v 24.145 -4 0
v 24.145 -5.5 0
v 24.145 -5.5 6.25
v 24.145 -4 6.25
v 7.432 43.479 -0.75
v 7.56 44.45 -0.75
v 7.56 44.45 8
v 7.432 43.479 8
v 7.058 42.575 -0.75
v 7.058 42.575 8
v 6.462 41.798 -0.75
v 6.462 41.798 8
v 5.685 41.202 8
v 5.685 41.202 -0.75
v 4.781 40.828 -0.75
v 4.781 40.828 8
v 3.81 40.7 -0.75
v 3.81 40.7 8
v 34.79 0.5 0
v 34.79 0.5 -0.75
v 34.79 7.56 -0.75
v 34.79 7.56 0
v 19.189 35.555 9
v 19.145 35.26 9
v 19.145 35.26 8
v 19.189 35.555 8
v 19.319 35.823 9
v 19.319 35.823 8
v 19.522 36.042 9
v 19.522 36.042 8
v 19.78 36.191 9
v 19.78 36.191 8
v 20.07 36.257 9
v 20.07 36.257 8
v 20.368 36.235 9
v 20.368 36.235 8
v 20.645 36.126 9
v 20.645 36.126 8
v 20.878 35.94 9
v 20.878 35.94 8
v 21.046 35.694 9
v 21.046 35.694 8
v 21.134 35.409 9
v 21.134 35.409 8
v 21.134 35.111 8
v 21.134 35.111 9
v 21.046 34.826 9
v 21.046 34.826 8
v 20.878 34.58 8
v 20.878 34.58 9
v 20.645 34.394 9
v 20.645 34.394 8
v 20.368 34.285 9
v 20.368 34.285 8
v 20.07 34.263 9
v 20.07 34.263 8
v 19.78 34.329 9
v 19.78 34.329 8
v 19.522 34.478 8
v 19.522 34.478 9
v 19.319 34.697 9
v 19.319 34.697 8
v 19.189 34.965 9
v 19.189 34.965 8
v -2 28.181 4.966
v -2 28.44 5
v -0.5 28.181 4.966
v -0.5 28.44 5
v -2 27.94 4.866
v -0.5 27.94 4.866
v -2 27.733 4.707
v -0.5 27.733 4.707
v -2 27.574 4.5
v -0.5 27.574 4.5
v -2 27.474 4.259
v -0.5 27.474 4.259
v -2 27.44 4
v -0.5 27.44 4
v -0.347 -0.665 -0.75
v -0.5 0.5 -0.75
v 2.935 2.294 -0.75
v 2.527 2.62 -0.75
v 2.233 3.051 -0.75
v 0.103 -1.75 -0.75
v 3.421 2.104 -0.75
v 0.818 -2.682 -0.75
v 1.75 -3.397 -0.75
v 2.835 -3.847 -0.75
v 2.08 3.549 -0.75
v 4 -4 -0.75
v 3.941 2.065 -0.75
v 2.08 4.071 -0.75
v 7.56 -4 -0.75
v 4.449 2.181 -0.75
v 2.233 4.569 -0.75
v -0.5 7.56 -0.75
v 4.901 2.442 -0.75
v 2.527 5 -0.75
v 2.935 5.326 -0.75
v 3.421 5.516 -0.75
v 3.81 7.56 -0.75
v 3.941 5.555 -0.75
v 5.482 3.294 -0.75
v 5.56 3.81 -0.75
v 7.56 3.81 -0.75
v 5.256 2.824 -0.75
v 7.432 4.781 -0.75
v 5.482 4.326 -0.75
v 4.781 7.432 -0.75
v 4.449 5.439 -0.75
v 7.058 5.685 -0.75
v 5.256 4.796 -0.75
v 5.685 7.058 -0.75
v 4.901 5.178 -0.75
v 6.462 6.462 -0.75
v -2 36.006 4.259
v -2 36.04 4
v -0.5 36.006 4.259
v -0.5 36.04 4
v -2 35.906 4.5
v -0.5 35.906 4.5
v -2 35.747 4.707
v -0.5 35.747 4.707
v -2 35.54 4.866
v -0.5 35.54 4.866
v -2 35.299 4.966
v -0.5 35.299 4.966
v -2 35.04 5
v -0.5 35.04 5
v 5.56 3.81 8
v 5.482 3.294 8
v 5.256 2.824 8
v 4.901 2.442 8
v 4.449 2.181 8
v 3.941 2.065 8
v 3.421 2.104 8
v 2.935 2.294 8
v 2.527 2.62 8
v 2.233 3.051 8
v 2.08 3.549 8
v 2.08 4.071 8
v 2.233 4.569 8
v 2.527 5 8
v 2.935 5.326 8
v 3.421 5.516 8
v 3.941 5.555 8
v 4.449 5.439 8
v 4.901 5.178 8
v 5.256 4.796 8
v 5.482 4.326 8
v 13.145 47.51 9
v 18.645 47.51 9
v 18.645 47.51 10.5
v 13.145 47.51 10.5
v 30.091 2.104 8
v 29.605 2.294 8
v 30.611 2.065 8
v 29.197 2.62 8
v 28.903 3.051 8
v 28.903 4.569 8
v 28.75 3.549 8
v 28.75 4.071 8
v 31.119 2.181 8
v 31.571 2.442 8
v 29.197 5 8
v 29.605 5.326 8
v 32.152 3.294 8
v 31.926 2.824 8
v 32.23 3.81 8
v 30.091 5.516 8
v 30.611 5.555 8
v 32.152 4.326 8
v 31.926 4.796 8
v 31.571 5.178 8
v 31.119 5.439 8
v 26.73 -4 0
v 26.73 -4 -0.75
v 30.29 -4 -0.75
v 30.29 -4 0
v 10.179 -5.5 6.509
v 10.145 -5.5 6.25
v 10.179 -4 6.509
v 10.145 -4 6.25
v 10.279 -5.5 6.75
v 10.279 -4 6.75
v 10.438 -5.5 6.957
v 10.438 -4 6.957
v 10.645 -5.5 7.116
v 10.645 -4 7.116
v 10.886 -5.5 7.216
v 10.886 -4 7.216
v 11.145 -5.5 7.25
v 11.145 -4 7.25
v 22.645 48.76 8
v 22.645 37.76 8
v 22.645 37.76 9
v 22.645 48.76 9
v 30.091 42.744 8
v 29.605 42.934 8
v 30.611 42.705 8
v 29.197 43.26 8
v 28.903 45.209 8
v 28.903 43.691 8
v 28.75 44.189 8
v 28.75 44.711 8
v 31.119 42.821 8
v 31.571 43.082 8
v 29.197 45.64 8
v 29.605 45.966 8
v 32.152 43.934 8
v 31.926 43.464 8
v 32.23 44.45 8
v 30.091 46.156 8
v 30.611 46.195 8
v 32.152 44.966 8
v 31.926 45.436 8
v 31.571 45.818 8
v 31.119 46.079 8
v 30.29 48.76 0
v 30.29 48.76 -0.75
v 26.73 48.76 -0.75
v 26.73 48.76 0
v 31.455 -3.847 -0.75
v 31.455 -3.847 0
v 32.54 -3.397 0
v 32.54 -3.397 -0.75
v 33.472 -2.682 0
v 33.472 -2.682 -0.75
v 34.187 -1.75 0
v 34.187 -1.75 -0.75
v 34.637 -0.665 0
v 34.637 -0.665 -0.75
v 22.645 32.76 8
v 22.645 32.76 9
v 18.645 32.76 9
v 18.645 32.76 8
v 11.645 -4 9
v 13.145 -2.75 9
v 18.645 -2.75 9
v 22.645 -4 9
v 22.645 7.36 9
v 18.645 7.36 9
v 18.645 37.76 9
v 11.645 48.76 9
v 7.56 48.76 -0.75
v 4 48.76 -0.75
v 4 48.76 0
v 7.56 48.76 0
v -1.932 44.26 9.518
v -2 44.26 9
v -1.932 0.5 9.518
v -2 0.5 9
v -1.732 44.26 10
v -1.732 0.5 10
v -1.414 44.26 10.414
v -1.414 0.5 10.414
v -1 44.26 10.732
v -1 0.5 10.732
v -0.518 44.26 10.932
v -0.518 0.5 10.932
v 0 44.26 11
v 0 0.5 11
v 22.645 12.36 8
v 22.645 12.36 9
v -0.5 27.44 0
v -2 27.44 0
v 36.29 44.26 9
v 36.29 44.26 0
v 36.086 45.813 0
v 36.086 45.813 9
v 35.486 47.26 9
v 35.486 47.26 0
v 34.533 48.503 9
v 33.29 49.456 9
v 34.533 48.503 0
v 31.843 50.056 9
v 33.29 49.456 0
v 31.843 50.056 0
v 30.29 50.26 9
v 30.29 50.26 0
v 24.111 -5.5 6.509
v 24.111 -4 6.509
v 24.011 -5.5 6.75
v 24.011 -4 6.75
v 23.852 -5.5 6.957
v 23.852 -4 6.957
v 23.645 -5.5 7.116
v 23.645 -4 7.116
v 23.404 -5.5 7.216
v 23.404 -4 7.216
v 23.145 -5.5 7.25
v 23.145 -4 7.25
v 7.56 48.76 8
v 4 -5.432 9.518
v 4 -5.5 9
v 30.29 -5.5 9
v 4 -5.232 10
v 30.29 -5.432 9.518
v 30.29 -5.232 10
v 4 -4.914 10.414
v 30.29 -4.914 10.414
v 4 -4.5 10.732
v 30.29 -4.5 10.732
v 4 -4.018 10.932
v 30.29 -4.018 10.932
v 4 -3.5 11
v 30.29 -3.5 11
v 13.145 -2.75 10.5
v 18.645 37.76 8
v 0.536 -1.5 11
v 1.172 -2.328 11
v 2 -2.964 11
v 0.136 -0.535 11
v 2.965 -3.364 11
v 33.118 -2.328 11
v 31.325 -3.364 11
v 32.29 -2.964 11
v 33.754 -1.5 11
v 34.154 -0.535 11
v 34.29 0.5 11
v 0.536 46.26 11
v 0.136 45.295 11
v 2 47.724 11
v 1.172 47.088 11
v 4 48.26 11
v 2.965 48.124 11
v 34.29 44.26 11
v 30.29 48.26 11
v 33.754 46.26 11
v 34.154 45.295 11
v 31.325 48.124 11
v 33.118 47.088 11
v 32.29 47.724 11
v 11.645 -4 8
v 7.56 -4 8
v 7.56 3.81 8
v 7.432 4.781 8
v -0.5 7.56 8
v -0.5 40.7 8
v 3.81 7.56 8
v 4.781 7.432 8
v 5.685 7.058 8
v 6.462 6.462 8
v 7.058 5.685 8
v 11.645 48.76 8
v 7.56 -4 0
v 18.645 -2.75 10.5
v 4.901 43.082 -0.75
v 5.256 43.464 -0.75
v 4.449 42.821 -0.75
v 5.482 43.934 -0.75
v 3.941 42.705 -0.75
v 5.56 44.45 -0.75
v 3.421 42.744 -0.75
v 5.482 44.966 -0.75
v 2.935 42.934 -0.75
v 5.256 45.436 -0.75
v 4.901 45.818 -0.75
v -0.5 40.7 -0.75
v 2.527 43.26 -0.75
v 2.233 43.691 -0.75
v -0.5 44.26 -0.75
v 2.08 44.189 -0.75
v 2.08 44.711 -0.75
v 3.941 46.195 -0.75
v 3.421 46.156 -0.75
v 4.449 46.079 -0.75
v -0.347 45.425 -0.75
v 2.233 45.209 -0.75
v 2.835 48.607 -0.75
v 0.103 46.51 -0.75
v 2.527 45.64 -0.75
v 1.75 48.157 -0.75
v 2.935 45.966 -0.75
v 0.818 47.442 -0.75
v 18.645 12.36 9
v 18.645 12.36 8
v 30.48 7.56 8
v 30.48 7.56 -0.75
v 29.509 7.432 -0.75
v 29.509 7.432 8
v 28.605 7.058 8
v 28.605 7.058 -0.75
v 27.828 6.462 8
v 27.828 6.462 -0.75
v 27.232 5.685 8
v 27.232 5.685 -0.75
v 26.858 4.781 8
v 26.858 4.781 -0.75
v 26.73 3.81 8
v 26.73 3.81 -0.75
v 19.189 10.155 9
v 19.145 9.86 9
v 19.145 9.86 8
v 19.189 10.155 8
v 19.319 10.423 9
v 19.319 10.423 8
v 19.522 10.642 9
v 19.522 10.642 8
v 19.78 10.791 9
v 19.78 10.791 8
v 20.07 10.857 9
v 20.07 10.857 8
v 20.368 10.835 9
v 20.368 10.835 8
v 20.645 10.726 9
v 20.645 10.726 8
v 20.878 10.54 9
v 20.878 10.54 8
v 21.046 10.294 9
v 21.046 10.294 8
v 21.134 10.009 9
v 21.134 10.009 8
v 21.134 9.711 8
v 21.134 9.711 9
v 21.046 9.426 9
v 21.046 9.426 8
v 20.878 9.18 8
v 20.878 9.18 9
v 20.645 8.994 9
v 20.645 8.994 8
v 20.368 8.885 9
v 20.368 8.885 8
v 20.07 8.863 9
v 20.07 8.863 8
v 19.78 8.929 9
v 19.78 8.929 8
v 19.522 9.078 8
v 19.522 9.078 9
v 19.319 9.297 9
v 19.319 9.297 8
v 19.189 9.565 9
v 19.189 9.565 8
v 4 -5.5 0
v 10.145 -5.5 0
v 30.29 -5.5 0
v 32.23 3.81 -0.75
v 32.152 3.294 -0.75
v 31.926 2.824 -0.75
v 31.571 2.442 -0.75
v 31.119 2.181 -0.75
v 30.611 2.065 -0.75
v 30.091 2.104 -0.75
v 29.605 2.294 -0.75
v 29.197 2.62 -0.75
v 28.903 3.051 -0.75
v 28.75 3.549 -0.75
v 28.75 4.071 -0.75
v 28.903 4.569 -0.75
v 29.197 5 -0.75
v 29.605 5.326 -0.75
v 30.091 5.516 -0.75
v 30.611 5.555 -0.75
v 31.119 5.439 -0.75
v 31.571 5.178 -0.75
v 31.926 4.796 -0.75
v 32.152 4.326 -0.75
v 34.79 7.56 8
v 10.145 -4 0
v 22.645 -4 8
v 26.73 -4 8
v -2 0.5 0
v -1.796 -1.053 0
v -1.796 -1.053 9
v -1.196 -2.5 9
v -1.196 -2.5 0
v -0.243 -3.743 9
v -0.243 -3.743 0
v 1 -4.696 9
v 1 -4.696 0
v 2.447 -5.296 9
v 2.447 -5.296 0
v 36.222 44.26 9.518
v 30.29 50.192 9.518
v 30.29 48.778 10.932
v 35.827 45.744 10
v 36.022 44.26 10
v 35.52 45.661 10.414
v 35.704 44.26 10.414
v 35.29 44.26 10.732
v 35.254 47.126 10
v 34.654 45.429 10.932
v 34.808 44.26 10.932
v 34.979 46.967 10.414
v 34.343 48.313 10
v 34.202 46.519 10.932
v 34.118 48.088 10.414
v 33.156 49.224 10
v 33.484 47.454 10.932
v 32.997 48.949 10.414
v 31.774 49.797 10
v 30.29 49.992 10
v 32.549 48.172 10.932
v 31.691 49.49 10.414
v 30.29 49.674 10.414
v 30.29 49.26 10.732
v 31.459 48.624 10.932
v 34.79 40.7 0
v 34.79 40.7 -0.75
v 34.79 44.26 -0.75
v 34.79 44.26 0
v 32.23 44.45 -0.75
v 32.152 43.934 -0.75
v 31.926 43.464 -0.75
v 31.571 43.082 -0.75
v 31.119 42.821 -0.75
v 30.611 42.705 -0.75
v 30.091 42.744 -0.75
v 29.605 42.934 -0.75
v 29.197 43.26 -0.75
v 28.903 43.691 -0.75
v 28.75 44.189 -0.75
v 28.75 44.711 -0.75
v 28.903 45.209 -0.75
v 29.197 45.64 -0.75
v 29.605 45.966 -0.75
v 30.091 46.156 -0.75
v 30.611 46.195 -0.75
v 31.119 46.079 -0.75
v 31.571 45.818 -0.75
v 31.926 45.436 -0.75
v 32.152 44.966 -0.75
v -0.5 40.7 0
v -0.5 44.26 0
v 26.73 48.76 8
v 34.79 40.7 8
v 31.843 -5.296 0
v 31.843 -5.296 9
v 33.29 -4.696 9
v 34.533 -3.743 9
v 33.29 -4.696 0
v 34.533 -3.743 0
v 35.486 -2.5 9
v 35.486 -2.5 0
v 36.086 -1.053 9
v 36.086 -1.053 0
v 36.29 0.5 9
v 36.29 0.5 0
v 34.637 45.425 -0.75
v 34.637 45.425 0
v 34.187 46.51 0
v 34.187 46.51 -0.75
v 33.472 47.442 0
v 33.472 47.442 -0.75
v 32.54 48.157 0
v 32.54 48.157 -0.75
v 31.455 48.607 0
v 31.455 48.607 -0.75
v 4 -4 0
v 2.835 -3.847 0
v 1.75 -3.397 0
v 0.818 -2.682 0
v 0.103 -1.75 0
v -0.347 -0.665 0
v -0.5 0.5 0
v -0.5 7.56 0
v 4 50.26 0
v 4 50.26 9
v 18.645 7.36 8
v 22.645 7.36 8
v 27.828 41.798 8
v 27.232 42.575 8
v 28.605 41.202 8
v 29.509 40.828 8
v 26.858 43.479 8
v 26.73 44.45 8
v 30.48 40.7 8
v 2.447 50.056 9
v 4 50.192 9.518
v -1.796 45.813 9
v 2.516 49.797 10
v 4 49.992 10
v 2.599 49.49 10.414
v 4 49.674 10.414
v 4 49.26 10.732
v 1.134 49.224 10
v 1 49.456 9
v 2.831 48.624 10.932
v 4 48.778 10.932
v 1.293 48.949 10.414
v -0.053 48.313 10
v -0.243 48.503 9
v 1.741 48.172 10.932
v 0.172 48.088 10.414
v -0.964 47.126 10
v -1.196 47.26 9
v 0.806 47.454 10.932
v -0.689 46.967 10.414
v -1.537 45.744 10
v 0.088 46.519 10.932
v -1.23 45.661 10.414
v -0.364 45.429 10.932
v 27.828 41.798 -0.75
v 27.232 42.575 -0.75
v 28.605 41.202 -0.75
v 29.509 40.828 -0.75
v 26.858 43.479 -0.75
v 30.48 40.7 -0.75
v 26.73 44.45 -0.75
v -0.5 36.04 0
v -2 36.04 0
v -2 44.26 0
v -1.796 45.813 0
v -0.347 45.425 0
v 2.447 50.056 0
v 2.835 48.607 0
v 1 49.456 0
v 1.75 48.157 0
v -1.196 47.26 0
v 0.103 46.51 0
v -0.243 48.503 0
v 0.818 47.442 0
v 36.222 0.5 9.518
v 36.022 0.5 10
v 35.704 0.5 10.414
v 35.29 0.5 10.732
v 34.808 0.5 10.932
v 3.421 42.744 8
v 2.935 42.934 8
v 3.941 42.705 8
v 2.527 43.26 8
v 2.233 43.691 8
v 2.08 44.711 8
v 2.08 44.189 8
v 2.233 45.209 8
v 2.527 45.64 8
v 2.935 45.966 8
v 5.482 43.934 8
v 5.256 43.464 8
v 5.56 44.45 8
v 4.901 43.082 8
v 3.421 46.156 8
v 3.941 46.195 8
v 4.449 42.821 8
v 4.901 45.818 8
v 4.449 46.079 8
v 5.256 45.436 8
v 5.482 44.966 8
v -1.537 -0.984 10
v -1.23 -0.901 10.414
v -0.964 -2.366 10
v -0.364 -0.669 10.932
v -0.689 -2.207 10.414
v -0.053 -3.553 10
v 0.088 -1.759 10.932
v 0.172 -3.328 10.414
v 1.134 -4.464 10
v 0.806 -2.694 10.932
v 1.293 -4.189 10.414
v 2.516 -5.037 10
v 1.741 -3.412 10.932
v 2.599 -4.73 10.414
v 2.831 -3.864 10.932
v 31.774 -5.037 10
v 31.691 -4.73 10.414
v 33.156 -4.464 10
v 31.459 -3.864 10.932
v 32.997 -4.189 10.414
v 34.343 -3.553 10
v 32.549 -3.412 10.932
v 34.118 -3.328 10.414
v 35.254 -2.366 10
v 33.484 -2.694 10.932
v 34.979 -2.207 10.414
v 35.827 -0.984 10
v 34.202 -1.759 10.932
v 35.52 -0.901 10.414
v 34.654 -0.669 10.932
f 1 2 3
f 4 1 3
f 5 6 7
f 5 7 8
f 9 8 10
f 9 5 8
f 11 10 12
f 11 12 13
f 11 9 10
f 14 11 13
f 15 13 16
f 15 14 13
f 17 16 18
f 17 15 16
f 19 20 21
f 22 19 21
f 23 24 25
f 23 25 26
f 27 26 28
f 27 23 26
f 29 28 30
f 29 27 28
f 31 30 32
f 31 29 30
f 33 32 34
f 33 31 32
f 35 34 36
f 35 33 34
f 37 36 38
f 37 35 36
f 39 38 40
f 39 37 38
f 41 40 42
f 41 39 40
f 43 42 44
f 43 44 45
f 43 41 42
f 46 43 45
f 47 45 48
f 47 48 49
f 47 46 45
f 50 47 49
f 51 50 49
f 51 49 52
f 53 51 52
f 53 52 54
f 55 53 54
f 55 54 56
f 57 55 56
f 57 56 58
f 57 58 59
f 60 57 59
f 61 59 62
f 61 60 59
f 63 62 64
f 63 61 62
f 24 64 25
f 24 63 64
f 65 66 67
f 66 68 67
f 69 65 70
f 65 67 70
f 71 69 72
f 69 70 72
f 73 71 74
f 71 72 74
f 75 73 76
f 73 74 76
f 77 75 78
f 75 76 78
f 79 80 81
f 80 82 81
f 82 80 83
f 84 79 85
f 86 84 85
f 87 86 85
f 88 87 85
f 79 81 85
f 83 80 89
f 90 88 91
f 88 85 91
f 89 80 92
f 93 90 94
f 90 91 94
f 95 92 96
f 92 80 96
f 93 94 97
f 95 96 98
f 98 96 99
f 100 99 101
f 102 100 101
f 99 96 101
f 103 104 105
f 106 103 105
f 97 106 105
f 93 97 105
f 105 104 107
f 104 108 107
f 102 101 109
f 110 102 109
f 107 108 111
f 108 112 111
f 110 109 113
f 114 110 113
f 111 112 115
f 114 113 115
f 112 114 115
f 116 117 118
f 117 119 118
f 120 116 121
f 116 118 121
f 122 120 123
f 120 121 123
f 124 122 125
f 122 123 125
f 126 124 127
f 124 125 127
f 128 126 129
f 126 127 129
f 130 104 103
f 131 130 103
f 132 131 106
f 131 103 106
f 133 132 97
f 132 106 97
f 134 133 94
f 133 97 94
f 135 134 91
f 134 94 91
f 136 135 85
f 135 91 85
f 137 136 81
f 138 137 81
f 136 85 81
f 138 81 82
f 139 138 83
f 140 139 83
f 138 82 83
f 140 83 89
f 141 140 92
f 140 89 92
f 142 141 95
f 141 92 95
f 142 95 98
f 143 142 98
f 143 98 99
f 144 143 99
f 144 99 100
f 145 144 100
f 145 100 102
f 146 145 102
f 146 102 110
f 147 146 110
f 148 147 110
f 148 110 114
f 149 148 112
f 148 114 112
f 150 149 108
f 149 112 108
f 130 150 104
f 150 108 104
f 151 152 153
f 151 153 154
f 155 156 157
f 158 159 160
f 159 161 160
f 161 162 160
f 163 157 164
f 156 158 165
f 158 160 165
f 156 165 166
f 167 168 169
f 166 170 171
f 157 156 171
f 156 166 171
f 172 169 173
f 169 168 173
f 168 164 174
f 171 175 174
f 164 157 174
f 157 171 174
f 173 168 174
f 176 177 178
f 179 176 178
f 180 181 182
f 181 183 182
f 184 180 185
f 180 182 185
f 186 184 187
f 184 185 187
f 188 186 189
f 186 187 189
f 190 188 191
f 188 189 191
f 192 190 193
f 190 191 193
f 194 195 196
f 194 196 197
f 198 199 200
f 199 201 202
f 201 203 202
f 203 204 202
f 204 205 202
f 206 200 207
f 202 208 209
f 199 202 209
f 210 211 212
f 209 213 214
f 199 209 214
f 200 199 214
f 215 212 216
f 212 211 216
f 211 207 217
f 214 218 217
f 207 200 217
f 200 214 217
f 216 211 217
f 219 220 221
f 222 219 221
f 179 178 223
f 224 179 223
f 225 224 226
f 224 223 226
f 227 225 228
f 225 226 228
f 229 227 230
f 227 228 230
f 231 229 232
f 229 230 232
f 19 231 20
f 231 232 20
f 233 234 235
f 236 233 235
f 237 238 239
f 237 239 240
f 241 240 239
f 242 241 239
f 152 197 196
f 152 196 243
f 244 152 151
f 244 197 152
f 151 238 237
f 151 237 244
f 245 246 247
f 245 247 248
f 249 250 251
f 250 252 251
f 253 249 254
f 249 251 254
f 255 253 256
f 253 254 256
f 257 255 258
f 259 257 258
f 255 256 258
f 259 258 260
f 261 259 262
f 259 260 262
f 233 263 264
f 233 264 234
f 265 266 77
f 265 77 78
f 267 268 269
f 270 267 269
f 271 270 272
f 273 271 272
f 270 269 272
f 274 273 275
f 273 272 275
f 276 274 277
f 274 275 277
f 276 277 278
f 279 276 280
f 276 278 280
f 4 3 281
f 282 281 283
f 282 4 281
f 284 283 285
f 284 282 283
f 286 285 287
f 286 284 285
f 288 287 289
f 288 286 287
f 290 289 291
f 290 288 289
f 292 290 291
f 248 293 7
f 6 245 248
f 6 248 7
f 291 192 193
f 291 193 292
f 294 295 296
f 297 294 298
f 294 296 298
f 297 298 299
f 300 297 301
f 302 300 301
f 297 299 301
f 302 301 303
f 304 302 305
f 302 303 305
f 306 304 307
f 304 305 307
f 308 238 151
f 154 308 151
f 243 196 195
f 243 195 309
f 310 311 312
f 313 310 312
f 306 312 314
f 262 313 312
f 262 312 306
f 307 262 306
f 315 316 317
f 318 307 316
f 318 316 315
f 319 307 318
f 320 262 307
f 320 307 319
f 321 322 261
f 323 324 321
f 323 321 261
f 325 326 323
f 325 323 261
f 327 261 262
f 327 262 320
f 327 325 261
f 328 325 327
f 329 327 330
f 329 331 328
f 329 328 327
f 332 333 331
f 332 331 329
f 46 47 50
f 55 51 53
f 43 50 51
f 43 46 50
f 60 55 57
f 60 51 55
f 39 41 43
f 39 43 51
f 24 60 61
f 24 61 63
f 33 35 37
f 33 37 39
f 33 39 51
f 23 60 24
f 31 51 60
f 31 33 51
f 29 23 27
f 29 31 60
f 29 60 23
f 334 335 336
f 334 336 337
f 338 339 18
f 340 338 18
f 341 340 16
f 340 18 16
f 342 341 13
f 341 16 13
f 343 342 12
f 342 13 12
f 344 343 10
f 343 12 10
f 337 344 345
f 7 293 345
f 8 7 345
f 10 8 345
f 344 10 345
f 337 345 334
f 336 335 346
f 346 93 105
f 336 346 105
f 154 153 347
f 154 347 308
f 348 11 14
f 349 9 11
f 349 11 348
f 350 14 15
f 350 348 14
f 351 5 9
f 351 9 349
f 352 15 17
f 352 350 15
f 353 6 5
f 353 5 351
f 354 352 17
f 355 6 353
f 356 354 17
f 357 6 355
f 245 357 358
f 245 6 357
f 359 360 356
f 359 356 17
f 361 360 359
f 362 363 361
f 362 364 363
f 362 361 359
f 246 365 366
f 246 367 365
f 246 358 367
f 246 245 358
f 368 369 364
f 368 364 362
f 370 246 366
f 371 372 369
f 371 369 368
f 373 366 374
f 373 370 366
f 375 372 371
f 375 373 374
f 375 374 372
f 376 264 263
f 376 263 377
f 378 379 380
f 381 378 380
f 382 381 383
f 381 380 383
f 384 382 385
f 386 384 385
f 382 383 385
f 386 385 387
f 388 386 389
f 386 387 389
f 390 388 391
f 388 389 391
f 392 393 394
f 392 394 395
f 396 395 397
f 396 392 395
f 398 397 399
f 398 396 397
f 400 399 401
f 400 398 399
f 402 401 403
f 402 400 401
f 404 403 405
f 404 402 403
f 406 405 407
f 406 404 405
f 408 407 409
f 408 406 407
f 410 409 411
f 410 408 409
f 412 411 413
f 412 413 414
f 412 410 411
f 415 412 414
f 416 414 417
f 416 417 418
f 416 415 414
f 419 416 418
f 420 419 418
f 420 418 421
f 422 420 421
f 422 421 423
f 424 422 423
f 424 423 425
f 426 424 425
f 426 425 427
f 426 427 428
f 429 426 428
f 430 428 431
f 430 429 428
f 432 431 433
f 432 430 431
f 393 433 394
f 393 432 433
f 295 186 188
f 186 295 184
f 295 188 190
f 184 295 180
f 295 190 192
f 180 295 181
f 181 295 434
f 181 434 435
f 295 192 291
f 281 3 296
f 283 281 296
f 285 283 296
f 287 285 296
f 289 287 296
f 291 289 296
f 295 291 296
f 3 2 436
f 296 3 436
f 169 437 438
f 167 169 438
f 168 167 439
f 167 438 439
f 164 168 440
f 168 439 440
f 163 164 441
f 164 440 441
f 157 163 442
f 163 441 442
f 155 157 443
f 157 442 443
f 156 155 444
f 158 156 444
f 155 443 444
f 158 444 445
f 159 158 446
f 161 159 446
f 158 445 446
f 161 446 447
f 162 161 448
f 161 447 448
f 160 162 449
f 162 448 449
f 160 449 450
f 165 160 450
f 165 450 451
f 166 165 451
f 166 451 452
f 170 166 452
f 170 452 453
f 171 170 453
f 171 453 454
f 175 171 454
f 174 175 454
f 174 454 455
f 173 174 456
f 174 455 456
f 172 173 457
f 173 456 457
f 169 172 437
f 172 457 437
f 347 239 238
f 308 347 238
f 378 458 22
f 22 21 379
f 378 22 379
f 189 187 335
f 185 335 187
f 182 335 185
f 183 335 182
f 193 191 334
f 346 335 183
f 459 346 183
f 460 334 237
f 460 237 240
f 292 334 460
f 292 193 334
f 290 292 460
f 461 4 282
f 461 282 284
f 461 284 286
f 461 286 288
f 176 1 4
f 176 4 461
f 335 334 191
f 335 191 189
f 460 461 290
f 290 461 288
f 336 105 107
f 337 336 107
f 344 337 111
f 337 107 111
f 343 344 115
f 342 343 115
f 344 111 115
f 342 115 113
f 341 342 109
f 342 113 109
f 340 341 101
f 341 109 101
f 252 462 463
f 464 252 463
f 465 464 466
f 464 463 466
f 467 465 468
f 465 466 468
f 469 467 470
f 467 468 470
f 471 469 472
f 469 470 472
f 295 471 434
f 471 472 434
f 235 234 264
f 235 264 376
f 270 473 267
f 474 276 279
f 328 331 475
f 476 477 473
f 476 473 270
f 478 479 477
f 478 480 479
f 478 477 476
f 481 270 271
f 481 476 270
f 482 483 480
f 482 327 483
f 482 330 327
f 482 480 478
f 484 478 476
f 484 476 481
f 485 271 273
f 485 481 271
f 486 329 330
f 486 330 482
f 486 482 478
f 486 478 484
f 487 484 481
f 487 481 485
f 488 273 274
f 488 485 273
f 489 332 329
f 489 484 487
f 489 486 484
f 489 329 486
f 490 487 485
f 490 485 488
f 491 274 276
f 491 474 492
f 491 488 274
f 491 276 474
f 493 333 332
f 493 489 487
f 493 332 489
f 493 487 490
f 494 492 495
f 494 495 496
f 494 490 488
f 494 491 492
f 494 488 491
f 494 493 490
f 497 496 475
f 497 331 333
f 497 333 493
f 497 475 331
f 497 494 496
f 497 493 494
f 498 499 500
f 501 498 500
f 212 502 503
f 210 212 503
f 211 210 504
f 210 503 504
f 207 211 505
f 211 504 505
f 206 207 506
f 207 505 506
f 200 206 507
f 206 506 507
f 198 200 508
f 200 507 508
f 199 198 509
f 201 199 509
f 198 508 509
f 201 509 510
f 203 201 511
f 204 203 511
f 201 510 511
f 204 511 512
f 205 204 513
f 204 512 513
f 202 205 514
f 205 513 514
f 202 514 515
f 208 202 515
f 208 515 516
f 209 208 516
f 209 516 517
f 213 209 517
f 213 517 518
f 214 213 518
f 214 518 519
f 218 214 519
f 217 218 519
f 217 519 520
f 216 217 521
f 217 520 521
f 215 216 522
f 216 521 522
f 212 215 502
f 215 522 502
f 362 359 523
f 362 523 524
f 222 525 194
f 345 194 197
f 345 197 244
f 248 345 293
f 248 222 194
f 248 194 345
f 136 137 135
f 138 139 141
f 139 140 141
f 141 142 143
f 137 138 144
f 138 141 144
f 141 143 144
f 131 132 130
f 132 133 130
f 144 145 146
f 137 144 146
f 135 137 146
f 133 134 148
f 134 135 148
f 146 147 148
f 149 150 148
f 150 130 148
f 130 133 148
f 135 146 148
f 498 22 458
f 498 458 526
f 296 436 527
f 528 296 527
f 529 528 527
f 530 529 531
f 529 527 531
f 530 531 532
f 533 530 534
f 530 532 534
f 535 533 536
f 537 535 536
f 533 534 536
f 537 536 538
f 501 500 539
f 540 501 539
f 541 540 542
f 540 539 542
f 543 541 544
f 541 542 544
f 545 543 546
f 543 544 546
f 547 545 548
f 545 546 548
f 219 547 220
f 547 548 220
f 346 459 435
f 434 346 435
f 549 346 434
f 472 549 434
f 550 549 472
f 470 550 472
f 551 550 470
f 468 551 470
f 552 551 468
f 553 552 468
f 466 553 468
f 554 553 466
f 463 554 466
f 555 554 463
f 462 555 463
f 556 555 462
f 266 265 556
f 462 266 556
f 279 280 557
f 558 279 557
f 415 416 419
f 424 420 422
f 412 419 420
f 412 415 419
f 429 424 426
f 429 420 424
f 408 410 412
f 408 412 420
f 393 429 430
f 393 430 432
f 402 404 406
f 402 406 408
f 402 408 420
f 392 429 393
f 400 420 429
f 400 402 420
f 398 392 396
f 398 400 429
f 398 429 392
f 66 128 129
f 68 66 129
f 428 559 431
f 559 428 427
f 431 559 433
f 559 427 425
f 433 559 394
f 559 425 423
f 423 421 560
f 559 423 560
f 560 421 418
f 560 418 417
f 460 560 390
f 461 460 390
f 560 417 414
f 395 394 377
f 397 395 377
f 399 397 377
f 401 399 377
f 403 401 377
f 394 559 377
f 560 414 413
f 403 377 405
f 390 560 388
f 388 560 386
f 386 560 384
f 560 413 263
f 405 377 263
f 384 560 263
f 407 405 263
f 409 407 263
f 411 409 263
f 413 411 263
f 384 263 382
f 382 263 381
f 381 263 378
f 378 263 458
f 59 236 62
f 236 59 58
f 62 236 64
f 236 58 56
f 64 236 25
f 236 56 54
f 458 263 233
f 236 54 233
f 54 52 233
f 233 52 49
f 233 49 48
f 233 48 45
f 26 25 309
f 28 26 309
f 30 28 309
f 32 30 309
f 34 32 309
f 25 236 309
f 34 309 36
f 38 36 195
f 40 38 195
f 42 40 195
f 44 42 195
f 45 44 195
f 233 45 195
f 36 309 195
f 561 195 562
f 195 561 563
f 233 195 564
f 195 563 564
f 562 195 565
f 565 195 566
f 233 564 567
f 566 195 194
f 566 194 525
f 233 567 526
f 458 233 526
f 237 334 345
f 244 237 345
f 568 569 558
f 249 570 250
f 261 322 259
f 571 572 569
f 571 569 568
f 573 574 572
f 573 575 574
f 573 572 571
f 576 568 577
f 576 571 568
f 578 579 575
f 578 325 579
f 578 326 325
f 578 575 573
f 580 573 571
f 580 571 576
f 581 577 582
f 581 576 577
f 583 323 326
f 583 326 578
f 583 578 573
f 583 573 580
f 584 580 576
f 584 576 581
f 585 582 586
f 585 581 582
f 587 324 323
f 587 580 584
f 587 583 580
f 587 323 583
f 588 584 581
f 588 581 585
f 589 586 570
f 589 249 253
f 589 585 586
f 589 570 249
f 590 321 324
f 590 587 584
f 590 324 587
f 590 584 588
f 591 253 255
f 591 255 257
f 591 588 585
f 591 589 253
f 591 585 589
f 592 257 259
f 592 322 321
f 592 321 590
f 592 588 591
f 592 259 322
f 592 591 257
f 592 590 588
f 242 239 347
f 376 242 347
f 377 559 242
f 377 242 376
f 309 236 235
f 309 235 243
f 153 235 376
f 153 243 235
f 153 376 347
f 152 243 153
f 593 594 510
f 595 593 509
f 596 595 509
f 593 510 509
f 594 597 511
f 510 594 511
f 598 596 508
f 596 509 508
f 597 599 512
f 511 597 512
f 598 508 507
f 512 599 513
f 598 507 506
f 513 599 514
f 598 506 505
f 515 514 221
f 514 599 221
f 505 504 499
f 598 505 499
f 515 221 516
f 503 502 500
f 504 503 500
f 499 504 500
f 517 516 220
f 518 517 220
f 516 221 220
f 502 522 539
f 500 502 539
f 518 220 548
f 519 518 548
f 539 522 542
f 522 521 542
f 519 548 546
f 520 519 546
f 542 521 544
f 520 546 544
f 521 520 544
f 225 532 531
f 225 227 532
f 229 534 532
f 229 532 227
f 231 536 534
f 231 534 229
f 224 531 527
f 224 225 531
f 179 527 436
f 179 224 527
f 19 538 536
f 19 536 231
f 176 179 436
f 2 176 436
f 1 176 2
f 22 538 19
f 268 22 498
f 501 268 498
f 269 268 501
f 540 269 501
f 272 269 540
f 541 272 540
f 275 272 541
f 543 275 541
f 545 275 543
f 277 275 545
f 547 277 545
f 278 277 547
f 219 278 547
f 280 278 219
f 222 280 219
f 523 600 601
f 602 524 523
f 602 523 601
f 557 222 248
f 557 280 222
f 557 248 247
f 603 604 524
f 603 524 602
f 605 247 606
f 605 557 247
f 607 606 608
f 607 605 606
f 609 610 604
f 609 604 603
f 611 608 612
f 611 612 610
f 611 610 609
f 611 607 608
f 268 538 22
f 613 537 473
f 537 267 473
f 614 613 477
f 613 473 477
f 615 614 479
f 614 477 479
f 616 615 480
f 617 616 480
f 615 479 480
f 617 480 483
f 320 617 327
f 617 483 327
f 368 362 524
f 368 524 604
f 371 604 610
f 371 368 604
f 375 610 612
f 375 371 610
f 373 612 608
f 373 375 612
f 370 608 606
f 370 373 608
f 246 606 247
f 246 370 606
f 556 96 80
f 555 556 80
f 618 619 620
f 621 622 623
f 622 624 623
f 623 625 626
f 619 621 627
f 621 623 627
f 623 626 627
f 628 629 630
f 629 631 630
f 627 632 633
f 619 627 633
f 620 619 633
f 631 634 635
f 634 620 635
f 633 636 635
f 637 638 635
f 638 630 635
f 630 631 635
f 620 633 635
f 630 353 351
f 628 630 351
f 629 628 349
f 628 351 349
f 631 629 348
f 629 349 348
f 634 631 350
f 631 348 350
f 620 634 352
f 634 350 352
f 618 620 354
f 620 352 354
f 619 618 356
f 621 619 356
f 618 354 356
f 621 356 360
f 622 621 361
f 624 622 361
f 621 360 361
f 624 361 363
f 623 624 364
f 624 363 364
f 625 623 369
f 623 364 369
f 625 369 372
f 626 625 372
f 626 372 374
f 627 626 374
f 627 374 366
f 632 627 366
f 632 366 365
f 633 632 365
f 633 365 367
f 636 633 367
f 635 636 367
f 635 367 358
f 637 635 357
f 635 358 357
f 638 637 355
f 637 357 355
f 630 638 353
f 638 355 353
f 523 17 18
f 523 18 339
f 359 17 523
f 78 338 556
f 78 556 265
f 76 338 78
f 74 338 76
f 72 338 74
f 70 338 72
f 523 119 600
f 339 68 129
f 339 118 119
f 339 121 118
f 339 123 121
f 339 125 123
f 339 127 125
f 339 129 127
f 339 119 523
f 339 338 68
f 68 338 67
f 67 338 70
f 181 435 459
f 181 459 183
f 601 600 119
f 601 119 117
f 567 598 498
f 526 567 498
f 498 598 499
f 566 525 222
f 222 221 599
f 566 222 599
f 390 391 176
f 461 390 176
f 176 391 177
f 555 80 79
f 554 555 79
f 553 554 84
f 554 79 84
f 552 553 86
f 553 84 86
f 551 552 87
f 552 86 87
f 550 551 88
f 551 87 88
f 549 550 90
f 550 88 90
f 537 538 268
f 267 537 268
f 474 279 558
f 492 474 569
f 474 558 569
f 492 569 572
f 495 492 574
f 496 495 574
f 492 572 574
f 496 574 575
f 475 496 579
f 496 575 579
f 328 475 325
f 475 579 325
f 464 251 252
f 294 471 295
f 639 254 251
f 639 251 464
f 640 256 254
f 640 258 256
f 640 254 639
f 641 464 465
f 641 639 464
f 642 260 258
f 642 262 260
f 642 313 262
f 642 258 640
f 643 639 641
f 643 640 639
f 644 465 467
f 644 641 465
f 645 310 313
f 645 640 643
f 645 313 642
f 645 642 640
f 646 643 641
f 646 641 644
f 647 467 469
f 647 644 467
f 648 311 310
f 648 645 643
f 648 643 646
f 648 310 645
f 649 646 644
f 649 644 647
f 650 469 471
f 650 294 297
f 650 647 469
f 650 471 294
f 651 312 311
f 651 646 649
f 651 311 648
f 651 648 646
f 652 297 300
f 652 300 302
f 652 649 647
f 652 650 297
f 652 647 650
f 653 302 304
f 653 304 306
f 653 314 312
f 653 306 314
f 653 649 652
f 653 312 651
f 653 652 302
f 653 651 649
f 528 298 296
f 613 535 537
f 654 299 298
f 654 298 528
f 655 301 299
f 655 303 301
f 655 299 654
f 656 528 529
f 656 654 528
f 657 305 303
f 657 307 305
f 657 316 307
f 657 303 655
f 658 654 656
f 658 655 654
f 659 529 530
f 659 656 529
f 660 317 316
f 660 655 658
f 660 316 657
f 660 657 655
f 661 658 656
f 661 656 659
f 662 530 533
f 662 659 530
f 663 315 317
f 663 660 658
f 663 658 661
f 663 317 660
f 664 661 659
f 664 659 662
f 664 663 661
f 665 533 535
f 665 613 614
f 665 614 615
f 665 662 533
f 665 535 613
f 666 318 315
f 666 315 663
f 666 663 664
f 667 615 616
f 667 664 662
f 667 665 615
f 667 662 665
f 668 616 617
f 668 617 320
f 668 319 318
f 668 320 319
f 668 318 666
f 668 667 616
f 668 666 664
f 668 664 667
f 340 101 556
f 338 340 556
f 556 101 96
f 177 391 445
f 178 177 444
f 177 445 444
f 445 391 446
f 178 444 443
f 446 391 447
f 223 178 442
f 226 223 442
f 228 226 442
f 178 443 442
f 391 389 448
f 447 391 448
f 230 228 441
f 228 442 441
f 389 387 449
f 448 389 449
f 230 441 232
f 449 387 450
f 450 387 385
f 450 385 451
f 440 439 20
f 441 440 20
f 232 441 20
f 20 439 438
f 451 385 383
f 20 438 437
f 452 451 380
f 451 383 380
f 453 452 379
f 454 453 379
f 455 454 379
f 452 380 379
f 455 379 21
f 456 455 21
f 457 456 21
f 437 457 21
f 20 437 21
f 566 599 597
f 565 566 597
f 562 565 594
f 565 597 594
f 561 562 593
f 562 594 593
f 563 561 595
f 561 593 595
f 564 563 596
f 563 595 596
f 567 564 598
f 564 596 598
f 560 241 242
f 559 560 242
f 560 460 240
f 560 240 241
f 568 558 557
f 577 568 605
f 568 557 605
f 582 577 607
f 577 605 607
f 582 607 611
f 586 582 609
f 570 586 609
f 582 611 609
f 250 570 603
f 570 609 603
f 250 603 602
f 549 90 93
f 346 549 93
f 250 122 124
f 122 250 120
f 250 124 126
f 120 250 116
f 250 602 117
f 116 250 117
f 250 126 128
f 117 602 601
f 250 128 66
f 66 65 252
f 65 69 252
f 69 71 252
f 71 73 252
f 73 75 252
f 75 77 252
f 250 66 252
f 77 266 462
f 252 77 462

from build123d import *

# Parameters (mm, degrees)
BOSS_EXTRUDE1_DEPTH = 8
SKETCH12_W          = 1.5
SKETCH12_H          = 8.6
BOSS_EXTRUDE8_DEPTH = 3
BOSS_EXTRUDE5_DEPTH = 3
BOSS_EXTRUDE6_START = 8.75
SKETCH10_R          = 1.75
BOSS_EXTRUDE6_DEPTH = 8.75
SKETCH11_W          = 14.1
SKETCH11_H          = 1.5
BOSS_EXTRUDE7_DEPTH = 1.5
FILLET1_R           = 2
CUT_EXTRUDE2_REACH  = 69.432
SKETCH13_W          = 14
SKETCH13_H          = 7.25
FILLET2_R           = 1
SKETCH14_W          = 11
SKETCH14_H          = 52.76
CUT_EXTRUDE3_DEPTH  = 1
SKETCH15_W          = 5.5
SKETCH15_H          = 50.26
CUT_EXTRUDE4_DEPTH  = 1.5
SKETCH17_W          = 4
SKETCH17_H          = 5
SKETCH17_R          = 1
BOSS_EXTRUDE9_DEPTH = 1


with BuildPart() as part:
    # Sketch1 → Boss-Extrude1 (new body)
    with BuildSketch(Plane.XY):
        with BuildLine():
            Line((-0.5, 27.44), (-0.5, 0.5))
            ThreePointArc((-0.5, 0.5), (0.818019485, -2.681980515), (4, -4))
            Line((4, -4), (30.29, -4))
            ThreePointArc((30.29, -4), (33.471980515, -2.681980515), (34.79, 0.5))
            Line((34.79, 0.5), (34.79, 44.26))
            ThreePointArc((34.79, 44.26), (33.471980515, 47.441980515), (30.29, 48.76))
            Line((30.29, 48.76), (4, 48.76))
            ThreePointArc((4, 48.76), (0.818019485, 47.441980515), (-0.5, 44.26))
            Line((-0.5, 44.26), (-0.5, 36.04))
            Line((-0.5, 36.04), (-2, 36.04))
            Line((-2, 36.04), (-2, 44.26))
            ThreePointArc((-2, 44.26), (-0.242640687, 48.502640687), (4, 50.26))
            Line((4, 50.26), (30.29, 50.26))
            ThreePointArc((30.29, 50.26), (34.532640687, 48.502640687), (36.29, 44.26))
            Line((36.29, 44.26), (36.29, 0.5))
            ThreePointArc((36.29, 0.5), (34.532640687, -3.742640687), (30.29, -5.5))
            Line((30.29, -5.5), (4, -5.5))
            ThreePointArc((4, -5.5), (-0.242640687, -3.742640687), (-2, 0.5))
            Line((-2, 0.5), (-2, 27.44))
            Line((-2, 27.44), (-0.5, 27.44))
        make_face()
    extrude(amount=BOSS_EXTRUDE1_DEPTH)

    # Sketch12 → Boss-Extrude8 (add)
    with BuildSketch(Plane.XY.offset(8)):
        with Locations((-1.25, 31.74)):
            Rectangle(SKETCH12_W, SKETCH12_H)
    extrude(amount=-BOSS_EXTRUDE8_DEPTH)

    # Sketch8 → Boss-Extrude5 (add)
    with BuildSketch(Plane.XY.offset(8)):
        with BuildLine():
            Line((-2, 44.26), (-2, 0.5))
            ThreePointArc((-2, 0.5), (-0.242640687, -3.742640687), (4, -5.5))
            Line((4, -5.5), (30.29, -5.5))
            ThreePointArc((30.29, -5.5), (34.532640687, -3.742640687), (36.29, 0.5))
            Line((36.29, 0.5), (36.29, 44.26))
            ThreePointArc((36.29, 44.26), (34.532640687, 48.502640687), (30.29, 50.26))
            Line((30.29, 50.26), (4, 50.26))
            ThreePointArc((4, 50.26), (-0.242640687, 48.502640687), (-2, 44.26))
        make_face()
    extrude(amount=BOSS_EXTRUDE5_DEPTH)

    # Sketch10 → Boss-Extrude6 (add)
    # profile 1 of 4: a face of its own
    with BuildSketch(Plane(origin=(0, 0, 8), x_dir=(-1, 0, 0), z_dir=(0, 0, -1)).offset(BOSS_EXTRUDE6_START)):
        with BuildLine():
            Line((-30.29, 48.76), (-26.73, 48.76))
            Line((-26.73, 48.76), (-26.73, 44.45))
            ThreePointArc((-26.73, 44.45), (-27.828349571, 41.798349571), (-30.48, 40.7))
            Line((-30.48, 40.7), (-34.79, 40.7))
            Line((-34.79, 40.7), (-34.79, 44.26))
            ThreePointArc((-34.79, 44.26), (-33.471980515, 47.441980515), (-30.29, 48.76))
        make_face()
        with Locations(Location((-30.48, 44.45, 0), (0, 0, 180))):
            Circle(SKETCH10_R, mode=Mode.SUBTRACT)
    # profile 2 of 4: a face of its own
    with BuildSketch(Plane(origin=(0, 0, 8), x_dir=(-1, 0, 0), z_dir=(0, 0, -1)).offset(BOSS_EXTRUDE6_START)):
        with BuildLine():
            Line((-3.81, 40.7), (0.5, 40.7))
            Line((0.5, 40.7), (0.5, 44.26))
            ThreePointArc((0.5, 44.26), (-0.818019485, 47.441980515), (-4, 48.76))
            Line((-4, 48.76), (-7.56, 48.76))
            Line((-7.56, 48.76), (-7.56, 44.45))
            ThreePointArc((-7.56, 44.45), (-6.461650429, 41.798349571), (-3.81, 40.7))
        make_face()
        with Locations(Location((-3.81, 44.45, 0), (0, 0, 180))):
            Circle(SKETCH10_R, mode=Mode.SUBTRACT)
    # profile 3 of 4: a face of its own
    with BuildSketch(Plane(origin=(0, 0, 8), x_dir=(-1, 0, 0), z_dir=(0, 0, -1)).offset(BOSS_EXTRUDE6_START)):
        with BuildLine():
            Line((0.5, 7.56), (0.5, 0.5))
            ThreePointArc((0.5, 0.5), (-0.818019485, -2.681980515), (-4, -4))
            Line((-4, -4), (-7.56, -4))
            Line((-7.56, -4), (-7.56, 3.81))
            ThreePointArc((-7.56, 3.81), (-6.461650429, 6.461650429), (-3.81, 7.56))
            Line((-3.81, 7.56), (0.5, 7.56))
        make_face()
        with Locations(Location((-3.81, 3.81, 0), (0, 0, 180))):
            Circle(SKETCH10_R, mode=Mode.SUBTRACT)
    # profile 4 of 4: a face of its own
    with BuildSketch(Plane(origin=(0, 0, 8), x_dir=(-1, 0, 0), z_dir=(0, 0, -1)).offset(BOSS_EXTRUDE6_START)):
        with BuildLine():
            Line((-26.73, -4), (-30.29, -4))
            ThreePointArc((-30.29, -4), (-33.471980515, -2.681980515), (-34.79, 0.5))
            Line((-34.79, 0.5), (-34.79, 7.56))
            Line((-34.79, 7.56), (-30.48, 7.56))
            ThreePointArc((-30.48, 7.56), (-27.828349571, 6.461650429), (-26.73, 3.81))
            Line((-26.73, 3.81), (-26.73, -4))
        make_face()
        with Locations(Location((-30.48, 3.81, 0), (0, 0, 180))):
            Circle(SKETCH10_R, mode=Mode.SUBTRACT)
    extrude(amount=-BOSS_EXTRUDE6_DEPTH)

    # Sketch11 → Boss-Extrude7 (add)
    with BuildSketch(Plane(origin=(0, 0, 8), x_dir=(-1, 0, 0), z_dir=(0, 0, -1))):
        with Locations((-17.145, -4.75)):
            Rectangle(SKETCH11_W, SKETCH11_H)
    extrude(amount=BOSS_EXTRUDE7_DEPTH)

    # Fillet1
    fillet1_edges = [part.edges().sort_by_distance(p)[0] for p in [
        (17.145, -5.5, 11),
        (36.29, 22.38, 11),
        (34.532640687, 48.502640687, 11),
        (17.145, 50.26, 11),
        (-0.242640687, 48.502640687, 11),
        (-2, 22.38, 11),
        (-0.242640687, -3.742640687, 11),
        (34.532640687, -3.742640687, 11),
    ]]
    fillet(fillet1_edges, radius=FILLET1_R)

    # Sketch13 → Cut-Extrude2 (cut, up to next)
    with BuildSketch(Plane.XZ.offset(5.5), mode=Mode.PRIVATE) as cut_extrude2_sk1:
        with Locations((17.145, 3.625)):
            Rectangle(SKETCH13_W, SKETCH13_H)
    cut_extrude2_tool1 = extrude(cut_extrude2_sk1.sketch, amount=-CUT_EXTRUDE2_REACH, mode=Mode.PRIVATE) & part.part
    add(cut_extrude2_tool1.solids().sort_by_distance((17.145, -5.5, 3.625))[0], mode=Mode.SUBTRACT)

    # Fillet2
    fillet2_edges = [part.edges().sort_by_distance(p)[0] for p in [
        (-1.25, 36.04, 5),
        (-1.25, 27.44, 5),
        (10.145, -4.75, 7.25),
        (24.145, -4.75, 7.25),
    ]]
    fillet(fillet2_edges, radius=FILLET2_R)

    # Sketch14 → Cut-Extrude3 (cut)
    with BuildSketch(Plane(origin=(0, 0, 8), x_dir=(-1, 0, 0), z_dir=(0, 0, -1))):
        with Locations((-17.145, 22.38)):
            Rectangle(SKETCH14_W, SKETCH14_H)
    extrude(amount=-CUT_EXTRUDE3_DEPTH, mode=Mode.SUBTRACT)

    # Sketch15 → Cut-Extrude4 (cut)
    with BuildSketch(Plane(origin=(0, 0, 9), x_dir=(-1, 0, 0), z_dir=(0, 0, -1))):
        with Locations((-15.895, 22.38)):
            Rectangle(SKETCH15_W, SKETCH15_H)
    extrude(amount=-CUT_EXTRUDE4_DEPTH, mode=Mode.SUBTRACT)

    # Sketch17 → Boss-Extrude9 (add)
    # profile 1 of 2: a face of its own
    with BuildSketch(Plane(origin=(0, 0, 9), x_dir=(-1, 0, 0), z_dir=(0, 0, -1))):
        with Locations((-20.645, 9.86)):
            Rectangle(SKETCH17_W, SKETCH17_H)
        with Locations((-20.145, 9.86)):
            Circle(SKETCH17_R, mode=Mode.SUBTRACT)
    # profile 2 of 2: a face of its own
    with BuildSketch(Plane(origin=(0, 0, 9), x_dir=(-1, 0, 0), z_dir=(0, 0, -1))):
        with Locations((-20.645, 35.26)):
            Rectangle(SKETCH17_W, SKETCH17_H)
        with Locations((-20.145, 35.26)):
            Circle(SKETCH17_R, mode=Mode.SUBTRACT)
    extrude(amount=BOSS_EXTRUDE9_DEPTH)


solid = part.part
